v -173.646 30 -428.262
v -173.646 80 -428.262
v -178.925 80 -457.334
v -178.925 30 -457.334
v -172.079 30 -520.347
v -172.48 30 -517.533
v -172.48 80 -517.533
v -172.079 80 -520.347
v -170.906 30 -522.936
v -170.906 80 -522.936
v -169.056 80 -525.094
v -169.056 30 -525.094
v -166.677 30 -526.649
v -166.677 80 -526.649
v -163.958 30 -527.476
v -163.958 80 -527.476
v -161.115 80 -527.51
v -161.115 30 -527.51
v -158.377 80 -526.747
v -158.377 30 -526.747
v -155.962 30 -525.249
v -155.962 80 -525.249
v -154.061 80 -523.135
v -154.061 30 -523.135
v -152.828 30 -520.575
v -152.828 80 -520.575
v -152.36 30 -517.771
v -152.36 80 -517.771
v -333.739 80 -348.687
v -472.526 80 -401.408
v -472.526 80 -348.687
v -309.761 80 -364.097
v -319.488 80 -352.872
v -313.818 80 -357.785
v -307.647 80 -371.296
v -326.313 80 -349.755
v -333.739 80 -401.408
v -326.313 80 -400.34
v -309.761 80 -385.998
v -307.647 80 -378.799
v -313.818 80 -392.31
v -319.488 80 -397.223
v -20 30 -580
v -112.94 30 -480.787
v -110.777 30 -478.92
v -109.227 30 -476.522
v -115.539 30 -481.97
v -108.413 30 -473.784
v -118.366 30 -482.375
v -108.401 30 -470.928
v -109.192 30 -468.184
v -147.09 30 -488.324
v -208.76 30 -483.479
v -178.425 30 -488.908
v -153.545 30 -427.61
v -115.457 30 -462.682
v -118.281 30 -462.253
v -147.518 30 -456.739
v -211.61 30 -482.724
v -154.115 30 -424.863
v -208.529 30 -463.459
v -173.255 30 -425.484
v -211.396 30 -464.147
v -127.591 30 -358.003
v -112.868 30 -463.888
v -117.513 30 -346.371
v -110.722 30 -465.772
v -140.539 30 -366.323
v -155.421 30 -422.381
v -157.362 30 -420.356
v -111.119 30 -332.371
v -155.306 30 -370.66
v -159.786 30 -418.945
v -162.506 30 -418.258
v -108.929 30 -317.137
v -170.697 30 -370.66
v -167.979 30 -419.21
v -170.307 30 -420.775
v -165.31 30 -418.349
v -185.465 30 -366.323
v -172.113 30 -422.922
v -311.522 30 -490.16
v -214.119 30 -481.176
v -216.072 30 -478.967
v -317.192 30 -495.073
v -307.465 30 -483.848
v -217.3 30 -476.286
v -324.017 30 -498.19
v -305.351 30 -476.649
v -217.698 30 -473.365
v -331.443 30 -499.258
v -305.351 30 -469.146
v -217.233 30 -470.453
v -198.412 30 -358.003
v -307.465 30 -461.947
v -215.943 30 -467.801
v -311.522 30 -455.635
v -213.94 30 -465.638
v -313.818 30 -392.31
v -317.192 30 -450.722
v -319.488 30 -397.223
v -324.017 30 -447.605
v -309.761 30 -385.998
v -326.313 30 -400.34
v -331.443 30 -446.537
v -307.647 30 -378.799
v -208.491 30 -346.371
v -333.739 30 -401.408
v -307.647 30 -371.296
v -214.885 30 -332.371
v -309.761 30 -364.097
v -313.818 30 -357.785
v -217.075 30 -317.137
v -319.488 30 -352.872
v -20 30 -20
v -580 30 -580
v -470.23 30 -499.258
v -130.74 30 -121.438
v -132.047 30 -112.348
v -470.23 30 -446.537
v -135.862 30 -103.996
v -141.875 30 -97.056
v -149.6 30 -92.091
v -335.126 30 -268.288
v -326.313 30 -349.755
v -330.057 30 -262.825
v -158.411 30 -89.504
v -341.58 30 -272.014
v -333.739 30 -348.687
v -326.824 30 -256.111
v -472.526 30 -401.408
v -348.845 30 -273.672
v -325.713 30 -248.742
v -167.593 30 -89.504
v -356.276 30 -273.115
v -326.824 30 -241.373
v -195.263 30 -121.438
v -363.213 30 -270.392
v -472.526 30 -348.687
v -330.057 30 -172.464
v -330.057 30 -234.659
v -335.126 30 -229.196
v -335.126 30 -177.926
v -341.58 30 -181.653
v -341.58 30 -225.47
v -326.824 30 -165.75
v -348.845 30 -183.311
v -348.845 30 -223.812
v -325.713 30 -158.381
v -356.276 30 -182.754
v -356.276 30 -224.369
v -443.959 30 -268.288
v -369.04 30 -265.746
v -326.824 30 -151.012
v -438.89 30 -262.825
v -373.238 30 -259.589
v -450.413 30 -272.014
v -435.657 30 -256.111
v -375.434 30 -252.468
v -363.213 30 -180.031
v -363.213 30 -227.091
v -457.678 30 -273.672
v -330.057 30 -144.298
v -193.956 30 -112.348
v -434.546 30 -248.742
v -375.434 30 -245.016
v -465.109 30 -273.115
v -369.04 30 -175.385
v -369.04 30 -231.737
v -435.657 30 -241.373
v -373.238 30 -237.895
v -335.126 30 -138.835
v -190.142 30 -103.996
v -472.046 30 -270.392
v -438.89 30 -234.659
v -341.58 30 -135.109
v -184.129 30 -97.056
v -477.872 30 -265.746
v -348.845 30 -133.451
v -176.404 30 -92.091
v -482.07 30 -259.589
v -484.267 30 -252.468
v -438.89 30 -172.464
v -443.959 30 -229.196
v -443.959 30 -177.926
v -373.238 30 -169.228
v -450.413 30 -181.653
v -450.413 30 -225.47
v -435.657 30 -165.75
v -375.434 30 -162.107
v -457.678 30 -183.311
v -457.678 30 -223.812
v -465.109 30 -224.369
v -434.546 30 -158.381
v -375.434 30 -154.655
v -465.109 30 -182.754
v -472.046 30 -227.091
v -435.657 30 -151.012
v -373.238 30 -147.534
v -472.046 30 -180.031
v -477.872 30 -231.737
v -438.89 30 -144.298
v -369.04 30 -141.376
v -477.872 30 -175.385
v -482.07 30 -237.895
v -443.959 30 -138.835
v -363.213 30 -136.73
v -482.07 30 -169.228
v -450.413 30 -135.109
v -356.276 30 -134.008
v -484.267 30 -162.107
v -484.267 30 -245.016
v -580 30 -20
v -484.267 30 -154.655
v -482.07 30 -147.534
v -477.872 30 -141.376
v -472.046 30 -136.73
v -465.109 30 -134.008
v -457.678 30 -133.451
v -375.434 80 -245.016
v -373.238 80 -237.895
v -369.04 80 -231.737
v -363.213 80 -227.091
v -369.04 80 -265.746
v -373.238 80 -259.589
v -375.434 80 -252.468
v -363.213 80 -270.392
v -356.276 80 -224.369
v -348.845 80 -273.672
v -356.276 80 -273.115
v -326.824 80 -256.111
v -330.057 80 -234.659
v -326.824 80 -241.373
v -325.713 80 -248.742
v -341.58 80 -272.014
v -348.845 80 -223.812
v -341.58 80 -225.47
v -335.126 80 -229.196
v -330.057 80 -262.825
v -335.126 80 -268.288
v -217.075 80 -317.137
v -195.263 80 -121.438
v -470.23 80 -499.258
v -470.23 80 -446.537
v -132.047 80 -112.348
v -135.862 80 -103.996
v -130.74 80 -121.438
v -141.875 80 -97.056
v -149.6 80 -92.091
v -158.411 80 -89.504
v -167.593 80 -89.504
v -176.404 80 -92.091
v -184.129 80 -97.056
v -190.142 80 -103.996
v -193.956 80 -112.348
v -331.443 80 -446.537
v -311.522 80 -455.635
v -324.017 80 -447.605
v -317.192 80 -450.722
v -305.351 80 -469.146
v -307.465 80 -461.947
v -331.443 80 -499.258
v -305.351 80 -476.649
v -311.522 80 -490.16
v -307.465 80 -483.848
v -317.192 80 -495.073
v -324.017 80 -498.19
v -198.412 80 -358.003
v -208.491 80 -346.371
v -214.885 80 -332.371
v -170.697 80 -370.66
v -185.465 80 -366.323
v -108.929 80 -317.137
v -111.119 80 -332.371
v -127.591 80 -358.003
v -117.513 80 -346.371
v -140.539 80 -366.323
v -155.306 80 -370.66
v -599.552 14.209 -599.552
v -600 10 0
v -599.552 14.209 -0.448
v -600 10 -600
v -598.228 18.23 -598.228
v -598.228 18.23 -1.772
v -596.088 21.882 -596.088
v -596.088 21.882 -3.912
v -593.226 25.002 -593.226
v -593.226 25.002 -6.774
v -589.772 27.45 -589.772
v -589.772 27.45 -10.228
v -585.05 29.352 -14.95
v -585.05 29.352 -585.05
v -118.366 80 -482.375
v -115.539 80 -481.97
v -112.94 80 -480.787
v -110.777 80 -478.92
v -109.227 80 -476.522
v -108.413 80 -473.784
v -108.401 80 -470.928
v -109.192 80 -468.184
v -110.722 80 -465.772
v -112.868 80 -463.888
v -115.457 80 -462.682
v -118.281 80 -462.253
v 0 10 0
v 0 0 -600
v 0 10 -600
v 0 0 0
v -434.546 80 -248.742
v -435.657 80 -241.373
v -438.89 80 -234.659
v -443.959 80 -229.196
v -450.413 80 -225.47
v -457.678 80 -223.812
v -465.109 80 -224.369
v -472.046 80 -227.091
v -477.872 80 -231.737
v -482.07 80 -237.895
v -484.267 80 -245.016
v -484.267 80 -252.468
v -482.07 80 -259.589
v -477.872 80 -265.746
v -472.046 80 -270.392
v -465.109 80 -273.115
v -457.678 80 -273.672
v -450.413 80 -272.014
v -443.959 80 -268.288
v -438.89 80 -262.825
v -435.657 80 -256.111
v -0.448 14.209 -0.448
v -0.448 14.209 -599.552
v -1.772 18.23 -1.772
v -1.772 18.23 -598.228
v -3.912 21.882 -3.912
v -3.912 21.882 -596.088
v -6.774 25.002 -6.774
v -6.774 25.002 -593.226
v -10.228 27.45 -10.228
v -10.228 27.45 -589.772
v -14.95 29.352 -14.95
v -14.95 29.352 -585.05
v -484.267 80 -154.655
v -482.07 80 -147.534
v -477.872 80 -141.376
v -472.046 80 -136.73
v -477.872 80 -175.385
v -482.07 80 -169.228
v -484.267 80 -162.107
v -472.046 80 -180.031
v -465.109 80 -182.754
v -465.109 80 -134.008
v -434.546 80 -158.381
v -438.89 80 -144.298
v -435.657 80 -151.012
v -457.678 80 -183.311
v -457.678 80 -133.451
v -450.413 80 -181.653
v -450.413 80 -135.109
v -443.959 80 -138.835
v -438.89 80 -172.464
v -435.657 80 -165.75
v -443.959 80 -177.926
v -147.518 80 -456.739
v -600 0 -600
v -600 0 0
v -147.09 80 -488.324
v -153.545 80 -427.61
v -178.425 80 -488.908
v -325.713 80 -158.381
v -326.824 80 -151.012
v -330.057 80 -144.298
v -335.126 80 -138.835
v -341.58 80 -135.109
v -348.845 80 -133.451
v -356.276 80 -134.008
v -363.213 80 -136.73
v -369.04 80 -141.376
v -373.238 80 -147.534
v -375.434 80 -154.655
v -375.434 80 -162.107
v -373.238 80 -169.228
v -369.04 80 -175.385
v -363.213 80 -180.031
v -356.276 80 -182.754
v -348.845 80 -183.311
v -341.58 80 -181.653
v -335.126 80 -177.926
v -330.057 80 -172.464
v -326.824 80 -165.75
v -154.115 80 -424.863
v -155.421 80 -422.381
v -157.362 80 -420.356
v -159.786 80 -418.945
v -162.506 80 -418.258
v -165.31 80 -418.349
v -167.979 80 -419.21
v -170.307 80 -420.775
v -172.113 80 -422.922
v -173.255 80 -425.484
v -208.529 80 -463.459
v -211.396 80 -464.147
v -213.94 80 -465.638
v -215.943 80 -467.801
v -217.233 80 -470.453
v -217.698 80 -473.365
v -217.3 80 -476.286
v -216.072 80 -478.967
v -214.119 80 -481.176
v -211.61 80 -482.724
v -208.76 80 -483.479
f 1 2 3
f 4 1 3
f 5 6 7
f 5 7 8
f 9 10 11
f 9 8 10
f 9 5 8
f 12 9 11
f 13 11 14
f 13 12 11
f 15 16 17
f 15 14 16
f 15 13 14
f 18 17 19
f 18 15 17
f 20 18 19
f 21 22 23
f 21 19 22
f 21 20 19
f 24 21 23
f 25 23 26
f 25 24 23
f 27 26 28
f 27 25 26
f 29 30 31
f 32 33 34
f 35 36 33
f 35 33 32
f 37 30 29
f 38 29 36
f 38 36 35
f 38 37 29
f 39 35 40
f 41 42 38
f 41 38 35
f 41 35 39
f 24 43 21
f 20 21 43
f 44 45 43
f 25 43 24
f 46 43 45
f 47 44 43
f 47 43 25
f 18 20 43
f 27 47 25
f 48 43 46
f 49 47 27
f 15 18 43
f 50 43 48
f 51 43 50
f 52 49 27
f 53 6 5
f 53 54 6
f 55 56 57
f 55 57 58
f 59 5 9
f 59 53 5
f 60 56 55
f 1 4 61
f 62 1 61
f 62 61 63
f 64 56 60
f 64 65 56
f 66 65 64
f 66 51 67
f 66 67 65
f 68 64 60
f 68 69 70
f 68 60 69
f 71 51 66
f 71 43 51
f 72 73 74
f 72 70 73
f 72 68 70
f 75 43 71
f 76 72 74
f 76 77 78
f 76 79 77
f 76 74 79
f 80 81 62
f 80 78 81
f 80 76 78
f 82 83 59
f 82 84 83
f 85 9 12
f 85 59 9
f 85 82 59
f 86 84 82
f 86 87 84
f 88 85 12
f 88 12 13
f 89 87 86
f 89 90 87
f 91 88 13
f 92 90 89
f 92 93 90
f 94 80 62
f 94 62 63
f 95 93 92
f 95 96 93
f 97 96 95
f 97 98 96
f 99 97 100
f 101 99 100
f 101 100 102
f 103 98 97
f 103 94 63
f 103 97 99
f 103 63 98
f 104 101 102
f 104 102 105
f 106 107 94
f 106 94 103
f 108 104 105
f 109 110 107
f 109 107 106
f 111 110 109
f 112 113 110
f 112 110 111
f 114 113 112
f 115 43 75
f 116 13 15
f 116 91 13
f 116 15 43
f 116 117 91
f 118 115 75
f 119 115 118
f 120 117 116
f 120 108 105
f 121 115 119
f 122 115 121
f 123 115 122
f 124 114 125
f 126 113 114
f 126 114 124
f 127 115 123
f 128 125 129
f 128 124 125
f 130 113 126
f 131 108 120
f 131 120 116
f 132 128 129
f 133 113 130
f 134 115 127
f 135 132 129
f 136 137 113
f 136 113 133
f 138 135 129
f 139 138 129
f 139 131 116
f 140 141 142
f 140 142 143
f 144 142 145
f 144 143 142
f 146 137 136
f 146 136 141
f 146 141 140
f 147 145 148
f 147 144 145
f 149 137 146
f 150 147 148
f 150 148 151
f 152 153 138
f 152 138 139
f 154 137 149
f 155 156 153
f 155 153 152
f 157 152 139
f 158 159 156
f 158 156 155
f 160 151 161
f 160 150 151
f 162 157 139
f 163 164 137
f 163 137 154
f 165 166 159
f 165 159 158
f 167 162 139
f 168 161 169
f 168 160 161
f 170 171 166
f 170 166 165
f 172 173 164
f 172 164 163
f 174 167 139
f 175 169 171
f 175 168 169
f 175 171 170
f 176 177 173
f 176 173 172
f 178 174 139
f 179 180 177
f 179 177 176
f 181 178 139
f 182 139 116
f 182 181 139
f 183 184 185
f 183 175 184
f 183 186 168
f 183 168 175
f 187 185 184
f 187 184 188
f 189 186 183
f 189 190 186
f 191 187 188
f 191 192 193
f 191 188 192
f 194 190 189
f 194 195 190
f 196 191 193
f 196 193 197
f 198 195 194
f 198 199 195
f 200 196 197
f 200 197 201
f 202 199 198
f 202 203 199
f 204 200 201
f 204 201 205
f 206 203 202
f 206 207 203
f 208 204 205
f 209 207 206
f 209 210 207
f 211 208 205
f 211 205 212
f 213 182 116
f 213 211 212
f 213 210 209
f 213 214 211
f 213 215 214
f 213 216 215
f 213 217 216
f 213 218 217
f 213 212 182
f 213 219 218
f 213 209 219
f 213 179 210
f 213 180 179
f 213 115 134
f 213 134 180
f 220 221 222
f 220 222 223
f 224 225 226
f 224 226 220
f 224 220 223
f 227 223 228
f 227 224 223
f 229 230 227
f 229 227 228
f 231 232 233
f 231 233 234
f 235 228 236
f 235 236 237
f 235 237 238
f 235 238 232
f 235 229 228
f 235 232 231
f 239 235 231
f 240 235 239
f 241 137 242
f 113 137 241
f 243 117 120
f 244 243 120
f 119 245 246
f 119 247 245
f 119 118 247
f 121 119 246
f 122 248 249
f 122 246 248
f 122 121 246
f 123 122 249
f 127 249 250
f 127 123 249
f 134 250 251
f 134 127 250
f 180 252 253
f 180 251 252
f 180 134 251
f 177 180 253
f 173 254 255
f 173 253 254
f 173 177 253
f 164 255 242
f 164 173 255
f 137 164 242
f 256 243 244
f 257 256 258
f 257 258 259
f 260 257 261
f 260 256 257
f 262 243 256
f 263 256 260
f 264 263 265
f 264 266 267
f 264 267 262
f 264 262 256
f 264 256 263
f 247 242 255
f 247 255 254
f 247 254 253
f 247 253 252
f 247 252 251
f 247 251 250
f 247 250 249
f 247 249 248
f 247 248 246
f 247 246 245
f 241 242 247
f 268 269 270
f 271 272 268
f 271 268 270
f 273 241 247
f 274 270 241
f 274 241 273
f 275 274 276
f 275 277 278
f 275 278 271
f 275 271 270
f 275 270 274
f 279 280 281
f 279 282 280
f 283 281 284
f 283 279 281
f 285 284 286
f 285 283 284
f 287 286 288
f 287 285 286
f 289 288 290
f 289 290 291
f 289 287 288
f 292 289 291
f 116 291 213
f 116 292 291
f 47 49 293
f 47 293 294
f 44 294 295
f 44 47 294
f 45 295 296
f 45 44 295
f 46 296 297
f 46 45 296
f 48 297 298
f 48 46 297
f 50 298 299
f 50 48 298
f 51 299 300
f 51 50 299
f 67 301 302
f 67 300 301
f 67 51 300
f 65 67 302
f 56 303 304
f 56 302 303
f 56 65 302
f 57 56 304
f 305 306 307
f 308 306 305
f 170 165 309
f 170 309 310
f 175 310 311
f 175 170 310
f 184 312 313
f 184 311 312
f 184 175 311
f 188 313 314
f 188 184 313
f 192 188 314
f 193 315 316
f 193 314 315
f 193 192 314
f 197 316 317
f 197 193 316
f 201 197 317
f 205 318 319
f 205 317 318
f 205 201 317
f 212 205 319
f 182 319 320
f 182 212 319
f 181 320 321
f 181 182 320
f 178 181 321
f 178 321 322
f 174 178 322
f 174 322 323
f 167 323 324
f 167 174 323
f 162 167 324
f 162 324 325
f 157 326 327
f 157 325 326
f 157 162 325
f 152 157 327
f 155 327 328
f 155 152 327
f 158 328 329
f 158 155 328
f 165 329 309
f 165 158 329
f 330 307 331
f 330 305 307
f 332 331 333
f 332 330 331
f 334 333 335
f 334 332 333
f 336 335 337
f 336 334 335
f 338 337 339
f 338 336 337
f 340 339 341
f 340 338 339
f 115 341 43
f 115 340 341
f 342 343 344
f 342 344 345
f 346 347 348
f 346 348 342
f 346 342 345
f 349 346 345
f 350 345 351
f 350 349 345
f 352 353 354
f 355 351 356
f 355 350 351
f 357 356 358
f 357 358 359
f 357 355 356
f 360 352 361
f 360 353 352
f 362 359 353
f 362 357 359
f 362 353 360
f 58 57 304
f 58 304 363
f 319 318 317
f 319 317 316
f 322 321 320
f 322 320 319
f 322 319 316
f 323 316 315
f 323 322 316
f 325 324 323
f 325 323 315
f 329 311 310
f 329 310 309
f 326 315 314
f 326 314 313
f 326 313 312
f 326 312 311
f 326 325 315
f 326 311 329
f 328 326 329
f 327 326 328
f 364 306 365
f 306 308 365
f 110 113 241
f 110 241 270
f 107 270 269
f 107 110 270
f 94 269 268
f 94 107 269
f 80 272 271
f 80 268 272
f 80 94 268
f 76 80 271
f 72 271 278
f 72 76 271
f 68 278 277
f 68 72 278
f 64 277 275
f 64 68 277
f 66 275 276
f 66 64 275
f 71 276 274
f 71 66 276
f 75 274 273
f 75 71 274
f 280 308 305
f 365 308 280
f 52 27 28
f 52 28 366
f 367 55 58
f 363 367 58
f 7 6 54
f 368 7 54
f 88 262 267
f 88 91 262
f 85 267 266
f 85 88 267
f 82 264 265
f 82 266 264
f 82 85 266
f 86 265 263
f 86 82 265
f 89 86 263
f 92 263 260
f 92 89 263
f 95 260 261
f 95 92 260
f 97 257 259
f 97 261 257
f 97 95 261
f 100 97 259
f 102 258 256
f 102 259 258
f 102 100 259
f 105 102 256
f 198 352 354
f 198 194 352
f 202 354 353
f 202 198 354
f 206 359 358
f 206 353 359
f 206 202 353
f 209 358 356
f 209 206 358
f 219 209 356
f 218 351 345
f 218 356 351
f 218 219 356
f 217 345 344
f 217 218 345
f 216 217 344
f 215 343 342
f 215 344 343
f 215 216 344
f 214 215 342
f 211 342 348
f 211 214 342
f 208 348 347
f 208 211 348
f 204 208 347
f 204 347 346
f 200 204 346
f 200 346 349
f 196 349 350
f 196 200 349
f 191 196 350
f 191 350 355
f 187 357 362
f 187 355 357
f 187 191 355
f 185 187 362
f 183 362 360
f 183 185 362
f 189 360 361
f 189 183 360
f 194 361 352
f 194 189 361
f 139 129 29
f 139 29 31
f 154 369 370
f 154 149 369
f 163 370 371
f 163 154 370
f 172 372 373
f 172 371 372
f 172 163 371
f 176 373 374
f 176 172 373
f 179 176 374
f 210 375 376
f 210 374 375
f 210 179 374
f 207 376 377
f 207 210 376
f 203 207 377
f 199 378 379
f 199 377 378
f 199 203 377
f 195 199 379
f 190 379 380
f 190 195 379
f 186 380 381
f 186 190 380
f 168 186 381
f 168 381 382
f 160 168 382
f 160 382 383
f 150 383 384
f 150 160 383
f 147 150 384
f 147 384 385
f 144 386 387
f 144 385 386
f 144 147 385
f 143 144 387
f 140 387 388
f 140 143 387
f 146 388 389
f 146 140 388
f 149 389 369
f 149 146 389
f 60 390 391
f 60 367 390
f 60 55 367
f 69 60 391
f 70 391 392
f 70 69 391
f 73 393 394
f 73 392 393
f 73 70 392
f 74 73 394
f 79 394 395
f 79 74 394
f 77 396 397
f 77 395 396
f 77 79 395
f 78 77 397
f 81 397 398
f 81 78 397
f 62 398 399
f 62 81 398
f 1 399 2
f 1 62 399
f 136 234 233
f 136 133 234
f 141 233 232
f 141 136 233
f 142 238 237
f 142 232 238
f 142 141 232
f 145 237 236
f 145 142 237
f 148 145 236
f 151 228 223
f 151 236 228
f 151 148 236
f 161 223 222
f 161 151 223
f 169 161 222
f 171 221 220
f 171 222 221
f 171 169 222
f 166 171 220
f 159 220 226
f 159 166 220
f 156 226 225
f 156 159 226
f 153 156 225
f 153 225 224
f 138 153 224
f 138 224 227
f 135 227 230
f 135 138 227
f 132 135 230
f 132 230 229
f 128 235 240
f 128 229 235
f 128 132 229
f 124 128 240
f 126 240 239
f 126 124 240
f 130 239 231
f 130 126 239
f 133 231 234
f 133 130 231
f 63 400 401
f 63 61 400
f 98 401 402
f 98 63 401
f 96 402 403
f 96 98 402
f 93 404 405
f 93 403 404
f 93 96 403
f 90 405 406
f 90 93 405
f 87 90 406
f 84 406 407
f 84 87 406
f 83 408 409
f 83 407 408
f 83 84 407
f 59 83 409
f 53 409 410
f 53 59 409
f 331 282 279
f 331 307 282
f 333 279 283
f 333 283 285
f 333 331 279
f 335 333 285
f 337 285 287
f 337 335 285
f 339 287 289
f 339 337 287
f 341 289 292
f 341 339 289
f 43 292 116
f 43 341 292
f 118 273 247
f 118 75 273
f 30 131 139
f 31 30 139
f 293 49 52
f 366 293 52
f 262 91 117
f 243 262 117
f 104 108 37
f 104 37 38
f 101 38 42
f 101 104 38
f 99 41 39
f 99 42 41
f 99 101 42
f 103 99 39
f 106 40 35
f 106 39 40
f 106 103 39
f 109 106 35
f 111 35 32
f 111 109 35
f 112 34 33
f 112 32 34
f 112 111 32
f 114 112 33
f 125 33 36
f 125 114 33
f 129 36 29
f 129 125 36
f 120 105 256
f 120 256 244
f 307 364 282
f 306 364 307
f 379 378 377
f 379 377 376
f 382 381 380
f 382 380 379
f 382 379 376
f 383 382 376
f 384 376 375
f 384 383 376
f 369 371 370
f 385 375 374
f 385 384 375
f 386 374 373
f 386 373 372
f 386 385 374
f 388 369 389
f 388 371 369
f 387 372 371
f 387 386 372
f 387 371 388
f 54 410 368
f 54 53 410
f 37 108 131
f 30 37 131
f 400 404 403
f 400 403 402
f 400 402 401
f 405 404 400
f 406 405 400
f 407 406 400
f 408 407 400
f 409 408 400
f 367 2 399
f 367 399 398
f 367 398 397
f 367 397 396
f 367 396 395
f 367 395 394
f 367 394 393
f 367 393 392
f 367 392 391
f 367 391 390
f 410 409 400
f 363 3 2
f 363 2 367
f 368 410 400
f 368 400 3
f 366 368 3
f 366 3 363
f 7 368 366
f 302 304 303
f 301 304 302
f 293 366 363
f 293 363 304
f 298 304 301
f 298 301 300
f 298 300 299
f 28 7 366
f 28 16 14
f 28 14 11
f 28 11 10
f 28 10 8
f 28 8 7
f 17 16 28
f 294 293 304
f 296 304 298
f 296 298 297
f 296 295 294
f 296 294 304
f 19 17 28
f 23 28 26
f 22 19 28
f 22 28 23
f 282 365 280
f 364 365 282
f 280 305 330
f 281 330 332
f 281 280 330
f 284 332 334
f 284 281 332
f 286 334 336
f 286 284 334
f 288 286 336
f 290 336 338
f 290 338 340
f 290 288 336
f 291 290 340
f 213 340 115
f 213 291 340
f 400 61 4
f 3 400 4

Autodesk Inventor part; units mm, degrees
ref_plane "YZ Plane" through (0, 0, 0) normal (1, 0, 0) x (0, 1, 0)
ref_plane "XZ Plane" through (0, 0, 0) normal (0, 1, 0) x (-1, 0, 0)
ref_plane "XY Plane" through (0, 0, 0) normal (0, 0, 1) x (1, 0, 0)
sketch "Boceto1" plane through (0, 0, 0) normal (0, 1, 0) x (-1, 0, 0)
  line L0 (0, 0) -> (600, 0)
  line L1 (600, 0) -> (600, -600)
  line L2 (600, -600) -> (0, -600)
  line L3 (0, -600) -> (0, 0)
  dimension "d0" = 600
  dimension "d1" = 600
extrude "Extrusión1" add sketch "Boceto1" along normal blind 30
fillet "Empalme1" radius 20 4 edges at (-300, 30, 0) (0, 30, -300) (-300, 30, -600) (-600, 30, -300)
sketch "Boceto2" plane through (0, 30, 0) normal (0, 1, 0) x (1, 0, 0)
  circle A0 centre (-350.7134, 158.3807) radius 25
  circle A1 centre (-459.5461, 158.3807) radius 25
  circle A2 centre (-350.7134, 248.7418) radius 25
  circle A3 centre (-459.5461, 248.7418) radius 25
  arc A4 (-195.2633, 121.4375) -> (-130.7405, 121.4375) centre (-163.0019, 121.4375) ccw
  arc A5 (-110.2556, 305.231) -> (-215.7481, 305.231) centre (-163.0019, 317.1367) ccw
  line L0 (-108.9286, 317.1367) -> (-130.7405, 121.4375)
  line L1 (-195.2633, 121.4375) -> (-217.0751, 317.1367)
  arc A6 (-333.7394, 348.6874) -> (-333.7394, 401.4079) centre (-333.7394, 375.0477) ccw
  line L2 (-333.7394, 348.6874) -> (-472.5261, 348.6874)
  line L3 (-333.7394, 401.4079) -> (-472.5261, 401.4079)
  line L4 (-472.5261, 401.4079) -> (-472.5261, 348.6874)
  arc A7 (-331.4434, 446.537) -> (-331.4434, 499.2575) centre (-331.4434, 472.8973) ccw
  line L5 (-331.4434, 446.537) -> (-470.23, 446.537)
  line L6 (-331.4434, 499.2575) -> (-470.23, 499.2575)
  line L7 (-470.23, 499.2575) -> (-470.23, 446.537)
  circle A8 centre (-163.585, 428.2615) radius 10.0613
  circle A9 centre (-118.3661, 472.3141) radius 10.0613
  circle A10 centre (-162.4187, 517.5331) radius 10.0613
  circle A11 centre (-207.6377, 473.4804) radius 10.0613
  line L8 (-118.2811, 462.2532) -> (-147.5182, 456.7387)
  line L9 (-118.3661, 482.3754) -> (-147.0901, 488.3237)
  line L10 (-152.3603, 517.7711) -> (-147.0901, 488.3237)
  line L11 (-172.48, 517.5331) -> (-178.4251, 488.9079)
  line L12 (-208.7596, 483.4789) -> (-178.4251, 488.9079)
  line L13 (-173.6463, 428.2615) -> (-178.9246, 457.3337)
  line L14 (-208.529, 463.4587) -> (-178.9246, 457.3337)
  line L15 (-153.5449, 427.6096) -> (-147.5182, 456.7387)
  point P0 (0, 0)
  point P1 (-163.0019, 472.8973)
  point P2 (-163.0019, 472.8973)
  point P3 (-163.0019, 472.8973)
  point P4 (-163.0019, 472.8973)
  dimension "d5" = 50
  dimension "d6" = 50
  dimension "d7" = 50
  dimension "d8" = 50
  dimension "d11" = 360
extrude "Extrusión2" add sketch "Boceto2" along normal blind 50 contours A0 | A1 | A2 | A3 | L1 A5 L0 A4 | L2 L4 L3 A6 | L5 L7 L6 A7 | A8 | A8 L13 L14 A11 L12 L11 A10 L10 L9 A9 L8 L15 | A11 | A9 | A10
properties part number "Lamina"
